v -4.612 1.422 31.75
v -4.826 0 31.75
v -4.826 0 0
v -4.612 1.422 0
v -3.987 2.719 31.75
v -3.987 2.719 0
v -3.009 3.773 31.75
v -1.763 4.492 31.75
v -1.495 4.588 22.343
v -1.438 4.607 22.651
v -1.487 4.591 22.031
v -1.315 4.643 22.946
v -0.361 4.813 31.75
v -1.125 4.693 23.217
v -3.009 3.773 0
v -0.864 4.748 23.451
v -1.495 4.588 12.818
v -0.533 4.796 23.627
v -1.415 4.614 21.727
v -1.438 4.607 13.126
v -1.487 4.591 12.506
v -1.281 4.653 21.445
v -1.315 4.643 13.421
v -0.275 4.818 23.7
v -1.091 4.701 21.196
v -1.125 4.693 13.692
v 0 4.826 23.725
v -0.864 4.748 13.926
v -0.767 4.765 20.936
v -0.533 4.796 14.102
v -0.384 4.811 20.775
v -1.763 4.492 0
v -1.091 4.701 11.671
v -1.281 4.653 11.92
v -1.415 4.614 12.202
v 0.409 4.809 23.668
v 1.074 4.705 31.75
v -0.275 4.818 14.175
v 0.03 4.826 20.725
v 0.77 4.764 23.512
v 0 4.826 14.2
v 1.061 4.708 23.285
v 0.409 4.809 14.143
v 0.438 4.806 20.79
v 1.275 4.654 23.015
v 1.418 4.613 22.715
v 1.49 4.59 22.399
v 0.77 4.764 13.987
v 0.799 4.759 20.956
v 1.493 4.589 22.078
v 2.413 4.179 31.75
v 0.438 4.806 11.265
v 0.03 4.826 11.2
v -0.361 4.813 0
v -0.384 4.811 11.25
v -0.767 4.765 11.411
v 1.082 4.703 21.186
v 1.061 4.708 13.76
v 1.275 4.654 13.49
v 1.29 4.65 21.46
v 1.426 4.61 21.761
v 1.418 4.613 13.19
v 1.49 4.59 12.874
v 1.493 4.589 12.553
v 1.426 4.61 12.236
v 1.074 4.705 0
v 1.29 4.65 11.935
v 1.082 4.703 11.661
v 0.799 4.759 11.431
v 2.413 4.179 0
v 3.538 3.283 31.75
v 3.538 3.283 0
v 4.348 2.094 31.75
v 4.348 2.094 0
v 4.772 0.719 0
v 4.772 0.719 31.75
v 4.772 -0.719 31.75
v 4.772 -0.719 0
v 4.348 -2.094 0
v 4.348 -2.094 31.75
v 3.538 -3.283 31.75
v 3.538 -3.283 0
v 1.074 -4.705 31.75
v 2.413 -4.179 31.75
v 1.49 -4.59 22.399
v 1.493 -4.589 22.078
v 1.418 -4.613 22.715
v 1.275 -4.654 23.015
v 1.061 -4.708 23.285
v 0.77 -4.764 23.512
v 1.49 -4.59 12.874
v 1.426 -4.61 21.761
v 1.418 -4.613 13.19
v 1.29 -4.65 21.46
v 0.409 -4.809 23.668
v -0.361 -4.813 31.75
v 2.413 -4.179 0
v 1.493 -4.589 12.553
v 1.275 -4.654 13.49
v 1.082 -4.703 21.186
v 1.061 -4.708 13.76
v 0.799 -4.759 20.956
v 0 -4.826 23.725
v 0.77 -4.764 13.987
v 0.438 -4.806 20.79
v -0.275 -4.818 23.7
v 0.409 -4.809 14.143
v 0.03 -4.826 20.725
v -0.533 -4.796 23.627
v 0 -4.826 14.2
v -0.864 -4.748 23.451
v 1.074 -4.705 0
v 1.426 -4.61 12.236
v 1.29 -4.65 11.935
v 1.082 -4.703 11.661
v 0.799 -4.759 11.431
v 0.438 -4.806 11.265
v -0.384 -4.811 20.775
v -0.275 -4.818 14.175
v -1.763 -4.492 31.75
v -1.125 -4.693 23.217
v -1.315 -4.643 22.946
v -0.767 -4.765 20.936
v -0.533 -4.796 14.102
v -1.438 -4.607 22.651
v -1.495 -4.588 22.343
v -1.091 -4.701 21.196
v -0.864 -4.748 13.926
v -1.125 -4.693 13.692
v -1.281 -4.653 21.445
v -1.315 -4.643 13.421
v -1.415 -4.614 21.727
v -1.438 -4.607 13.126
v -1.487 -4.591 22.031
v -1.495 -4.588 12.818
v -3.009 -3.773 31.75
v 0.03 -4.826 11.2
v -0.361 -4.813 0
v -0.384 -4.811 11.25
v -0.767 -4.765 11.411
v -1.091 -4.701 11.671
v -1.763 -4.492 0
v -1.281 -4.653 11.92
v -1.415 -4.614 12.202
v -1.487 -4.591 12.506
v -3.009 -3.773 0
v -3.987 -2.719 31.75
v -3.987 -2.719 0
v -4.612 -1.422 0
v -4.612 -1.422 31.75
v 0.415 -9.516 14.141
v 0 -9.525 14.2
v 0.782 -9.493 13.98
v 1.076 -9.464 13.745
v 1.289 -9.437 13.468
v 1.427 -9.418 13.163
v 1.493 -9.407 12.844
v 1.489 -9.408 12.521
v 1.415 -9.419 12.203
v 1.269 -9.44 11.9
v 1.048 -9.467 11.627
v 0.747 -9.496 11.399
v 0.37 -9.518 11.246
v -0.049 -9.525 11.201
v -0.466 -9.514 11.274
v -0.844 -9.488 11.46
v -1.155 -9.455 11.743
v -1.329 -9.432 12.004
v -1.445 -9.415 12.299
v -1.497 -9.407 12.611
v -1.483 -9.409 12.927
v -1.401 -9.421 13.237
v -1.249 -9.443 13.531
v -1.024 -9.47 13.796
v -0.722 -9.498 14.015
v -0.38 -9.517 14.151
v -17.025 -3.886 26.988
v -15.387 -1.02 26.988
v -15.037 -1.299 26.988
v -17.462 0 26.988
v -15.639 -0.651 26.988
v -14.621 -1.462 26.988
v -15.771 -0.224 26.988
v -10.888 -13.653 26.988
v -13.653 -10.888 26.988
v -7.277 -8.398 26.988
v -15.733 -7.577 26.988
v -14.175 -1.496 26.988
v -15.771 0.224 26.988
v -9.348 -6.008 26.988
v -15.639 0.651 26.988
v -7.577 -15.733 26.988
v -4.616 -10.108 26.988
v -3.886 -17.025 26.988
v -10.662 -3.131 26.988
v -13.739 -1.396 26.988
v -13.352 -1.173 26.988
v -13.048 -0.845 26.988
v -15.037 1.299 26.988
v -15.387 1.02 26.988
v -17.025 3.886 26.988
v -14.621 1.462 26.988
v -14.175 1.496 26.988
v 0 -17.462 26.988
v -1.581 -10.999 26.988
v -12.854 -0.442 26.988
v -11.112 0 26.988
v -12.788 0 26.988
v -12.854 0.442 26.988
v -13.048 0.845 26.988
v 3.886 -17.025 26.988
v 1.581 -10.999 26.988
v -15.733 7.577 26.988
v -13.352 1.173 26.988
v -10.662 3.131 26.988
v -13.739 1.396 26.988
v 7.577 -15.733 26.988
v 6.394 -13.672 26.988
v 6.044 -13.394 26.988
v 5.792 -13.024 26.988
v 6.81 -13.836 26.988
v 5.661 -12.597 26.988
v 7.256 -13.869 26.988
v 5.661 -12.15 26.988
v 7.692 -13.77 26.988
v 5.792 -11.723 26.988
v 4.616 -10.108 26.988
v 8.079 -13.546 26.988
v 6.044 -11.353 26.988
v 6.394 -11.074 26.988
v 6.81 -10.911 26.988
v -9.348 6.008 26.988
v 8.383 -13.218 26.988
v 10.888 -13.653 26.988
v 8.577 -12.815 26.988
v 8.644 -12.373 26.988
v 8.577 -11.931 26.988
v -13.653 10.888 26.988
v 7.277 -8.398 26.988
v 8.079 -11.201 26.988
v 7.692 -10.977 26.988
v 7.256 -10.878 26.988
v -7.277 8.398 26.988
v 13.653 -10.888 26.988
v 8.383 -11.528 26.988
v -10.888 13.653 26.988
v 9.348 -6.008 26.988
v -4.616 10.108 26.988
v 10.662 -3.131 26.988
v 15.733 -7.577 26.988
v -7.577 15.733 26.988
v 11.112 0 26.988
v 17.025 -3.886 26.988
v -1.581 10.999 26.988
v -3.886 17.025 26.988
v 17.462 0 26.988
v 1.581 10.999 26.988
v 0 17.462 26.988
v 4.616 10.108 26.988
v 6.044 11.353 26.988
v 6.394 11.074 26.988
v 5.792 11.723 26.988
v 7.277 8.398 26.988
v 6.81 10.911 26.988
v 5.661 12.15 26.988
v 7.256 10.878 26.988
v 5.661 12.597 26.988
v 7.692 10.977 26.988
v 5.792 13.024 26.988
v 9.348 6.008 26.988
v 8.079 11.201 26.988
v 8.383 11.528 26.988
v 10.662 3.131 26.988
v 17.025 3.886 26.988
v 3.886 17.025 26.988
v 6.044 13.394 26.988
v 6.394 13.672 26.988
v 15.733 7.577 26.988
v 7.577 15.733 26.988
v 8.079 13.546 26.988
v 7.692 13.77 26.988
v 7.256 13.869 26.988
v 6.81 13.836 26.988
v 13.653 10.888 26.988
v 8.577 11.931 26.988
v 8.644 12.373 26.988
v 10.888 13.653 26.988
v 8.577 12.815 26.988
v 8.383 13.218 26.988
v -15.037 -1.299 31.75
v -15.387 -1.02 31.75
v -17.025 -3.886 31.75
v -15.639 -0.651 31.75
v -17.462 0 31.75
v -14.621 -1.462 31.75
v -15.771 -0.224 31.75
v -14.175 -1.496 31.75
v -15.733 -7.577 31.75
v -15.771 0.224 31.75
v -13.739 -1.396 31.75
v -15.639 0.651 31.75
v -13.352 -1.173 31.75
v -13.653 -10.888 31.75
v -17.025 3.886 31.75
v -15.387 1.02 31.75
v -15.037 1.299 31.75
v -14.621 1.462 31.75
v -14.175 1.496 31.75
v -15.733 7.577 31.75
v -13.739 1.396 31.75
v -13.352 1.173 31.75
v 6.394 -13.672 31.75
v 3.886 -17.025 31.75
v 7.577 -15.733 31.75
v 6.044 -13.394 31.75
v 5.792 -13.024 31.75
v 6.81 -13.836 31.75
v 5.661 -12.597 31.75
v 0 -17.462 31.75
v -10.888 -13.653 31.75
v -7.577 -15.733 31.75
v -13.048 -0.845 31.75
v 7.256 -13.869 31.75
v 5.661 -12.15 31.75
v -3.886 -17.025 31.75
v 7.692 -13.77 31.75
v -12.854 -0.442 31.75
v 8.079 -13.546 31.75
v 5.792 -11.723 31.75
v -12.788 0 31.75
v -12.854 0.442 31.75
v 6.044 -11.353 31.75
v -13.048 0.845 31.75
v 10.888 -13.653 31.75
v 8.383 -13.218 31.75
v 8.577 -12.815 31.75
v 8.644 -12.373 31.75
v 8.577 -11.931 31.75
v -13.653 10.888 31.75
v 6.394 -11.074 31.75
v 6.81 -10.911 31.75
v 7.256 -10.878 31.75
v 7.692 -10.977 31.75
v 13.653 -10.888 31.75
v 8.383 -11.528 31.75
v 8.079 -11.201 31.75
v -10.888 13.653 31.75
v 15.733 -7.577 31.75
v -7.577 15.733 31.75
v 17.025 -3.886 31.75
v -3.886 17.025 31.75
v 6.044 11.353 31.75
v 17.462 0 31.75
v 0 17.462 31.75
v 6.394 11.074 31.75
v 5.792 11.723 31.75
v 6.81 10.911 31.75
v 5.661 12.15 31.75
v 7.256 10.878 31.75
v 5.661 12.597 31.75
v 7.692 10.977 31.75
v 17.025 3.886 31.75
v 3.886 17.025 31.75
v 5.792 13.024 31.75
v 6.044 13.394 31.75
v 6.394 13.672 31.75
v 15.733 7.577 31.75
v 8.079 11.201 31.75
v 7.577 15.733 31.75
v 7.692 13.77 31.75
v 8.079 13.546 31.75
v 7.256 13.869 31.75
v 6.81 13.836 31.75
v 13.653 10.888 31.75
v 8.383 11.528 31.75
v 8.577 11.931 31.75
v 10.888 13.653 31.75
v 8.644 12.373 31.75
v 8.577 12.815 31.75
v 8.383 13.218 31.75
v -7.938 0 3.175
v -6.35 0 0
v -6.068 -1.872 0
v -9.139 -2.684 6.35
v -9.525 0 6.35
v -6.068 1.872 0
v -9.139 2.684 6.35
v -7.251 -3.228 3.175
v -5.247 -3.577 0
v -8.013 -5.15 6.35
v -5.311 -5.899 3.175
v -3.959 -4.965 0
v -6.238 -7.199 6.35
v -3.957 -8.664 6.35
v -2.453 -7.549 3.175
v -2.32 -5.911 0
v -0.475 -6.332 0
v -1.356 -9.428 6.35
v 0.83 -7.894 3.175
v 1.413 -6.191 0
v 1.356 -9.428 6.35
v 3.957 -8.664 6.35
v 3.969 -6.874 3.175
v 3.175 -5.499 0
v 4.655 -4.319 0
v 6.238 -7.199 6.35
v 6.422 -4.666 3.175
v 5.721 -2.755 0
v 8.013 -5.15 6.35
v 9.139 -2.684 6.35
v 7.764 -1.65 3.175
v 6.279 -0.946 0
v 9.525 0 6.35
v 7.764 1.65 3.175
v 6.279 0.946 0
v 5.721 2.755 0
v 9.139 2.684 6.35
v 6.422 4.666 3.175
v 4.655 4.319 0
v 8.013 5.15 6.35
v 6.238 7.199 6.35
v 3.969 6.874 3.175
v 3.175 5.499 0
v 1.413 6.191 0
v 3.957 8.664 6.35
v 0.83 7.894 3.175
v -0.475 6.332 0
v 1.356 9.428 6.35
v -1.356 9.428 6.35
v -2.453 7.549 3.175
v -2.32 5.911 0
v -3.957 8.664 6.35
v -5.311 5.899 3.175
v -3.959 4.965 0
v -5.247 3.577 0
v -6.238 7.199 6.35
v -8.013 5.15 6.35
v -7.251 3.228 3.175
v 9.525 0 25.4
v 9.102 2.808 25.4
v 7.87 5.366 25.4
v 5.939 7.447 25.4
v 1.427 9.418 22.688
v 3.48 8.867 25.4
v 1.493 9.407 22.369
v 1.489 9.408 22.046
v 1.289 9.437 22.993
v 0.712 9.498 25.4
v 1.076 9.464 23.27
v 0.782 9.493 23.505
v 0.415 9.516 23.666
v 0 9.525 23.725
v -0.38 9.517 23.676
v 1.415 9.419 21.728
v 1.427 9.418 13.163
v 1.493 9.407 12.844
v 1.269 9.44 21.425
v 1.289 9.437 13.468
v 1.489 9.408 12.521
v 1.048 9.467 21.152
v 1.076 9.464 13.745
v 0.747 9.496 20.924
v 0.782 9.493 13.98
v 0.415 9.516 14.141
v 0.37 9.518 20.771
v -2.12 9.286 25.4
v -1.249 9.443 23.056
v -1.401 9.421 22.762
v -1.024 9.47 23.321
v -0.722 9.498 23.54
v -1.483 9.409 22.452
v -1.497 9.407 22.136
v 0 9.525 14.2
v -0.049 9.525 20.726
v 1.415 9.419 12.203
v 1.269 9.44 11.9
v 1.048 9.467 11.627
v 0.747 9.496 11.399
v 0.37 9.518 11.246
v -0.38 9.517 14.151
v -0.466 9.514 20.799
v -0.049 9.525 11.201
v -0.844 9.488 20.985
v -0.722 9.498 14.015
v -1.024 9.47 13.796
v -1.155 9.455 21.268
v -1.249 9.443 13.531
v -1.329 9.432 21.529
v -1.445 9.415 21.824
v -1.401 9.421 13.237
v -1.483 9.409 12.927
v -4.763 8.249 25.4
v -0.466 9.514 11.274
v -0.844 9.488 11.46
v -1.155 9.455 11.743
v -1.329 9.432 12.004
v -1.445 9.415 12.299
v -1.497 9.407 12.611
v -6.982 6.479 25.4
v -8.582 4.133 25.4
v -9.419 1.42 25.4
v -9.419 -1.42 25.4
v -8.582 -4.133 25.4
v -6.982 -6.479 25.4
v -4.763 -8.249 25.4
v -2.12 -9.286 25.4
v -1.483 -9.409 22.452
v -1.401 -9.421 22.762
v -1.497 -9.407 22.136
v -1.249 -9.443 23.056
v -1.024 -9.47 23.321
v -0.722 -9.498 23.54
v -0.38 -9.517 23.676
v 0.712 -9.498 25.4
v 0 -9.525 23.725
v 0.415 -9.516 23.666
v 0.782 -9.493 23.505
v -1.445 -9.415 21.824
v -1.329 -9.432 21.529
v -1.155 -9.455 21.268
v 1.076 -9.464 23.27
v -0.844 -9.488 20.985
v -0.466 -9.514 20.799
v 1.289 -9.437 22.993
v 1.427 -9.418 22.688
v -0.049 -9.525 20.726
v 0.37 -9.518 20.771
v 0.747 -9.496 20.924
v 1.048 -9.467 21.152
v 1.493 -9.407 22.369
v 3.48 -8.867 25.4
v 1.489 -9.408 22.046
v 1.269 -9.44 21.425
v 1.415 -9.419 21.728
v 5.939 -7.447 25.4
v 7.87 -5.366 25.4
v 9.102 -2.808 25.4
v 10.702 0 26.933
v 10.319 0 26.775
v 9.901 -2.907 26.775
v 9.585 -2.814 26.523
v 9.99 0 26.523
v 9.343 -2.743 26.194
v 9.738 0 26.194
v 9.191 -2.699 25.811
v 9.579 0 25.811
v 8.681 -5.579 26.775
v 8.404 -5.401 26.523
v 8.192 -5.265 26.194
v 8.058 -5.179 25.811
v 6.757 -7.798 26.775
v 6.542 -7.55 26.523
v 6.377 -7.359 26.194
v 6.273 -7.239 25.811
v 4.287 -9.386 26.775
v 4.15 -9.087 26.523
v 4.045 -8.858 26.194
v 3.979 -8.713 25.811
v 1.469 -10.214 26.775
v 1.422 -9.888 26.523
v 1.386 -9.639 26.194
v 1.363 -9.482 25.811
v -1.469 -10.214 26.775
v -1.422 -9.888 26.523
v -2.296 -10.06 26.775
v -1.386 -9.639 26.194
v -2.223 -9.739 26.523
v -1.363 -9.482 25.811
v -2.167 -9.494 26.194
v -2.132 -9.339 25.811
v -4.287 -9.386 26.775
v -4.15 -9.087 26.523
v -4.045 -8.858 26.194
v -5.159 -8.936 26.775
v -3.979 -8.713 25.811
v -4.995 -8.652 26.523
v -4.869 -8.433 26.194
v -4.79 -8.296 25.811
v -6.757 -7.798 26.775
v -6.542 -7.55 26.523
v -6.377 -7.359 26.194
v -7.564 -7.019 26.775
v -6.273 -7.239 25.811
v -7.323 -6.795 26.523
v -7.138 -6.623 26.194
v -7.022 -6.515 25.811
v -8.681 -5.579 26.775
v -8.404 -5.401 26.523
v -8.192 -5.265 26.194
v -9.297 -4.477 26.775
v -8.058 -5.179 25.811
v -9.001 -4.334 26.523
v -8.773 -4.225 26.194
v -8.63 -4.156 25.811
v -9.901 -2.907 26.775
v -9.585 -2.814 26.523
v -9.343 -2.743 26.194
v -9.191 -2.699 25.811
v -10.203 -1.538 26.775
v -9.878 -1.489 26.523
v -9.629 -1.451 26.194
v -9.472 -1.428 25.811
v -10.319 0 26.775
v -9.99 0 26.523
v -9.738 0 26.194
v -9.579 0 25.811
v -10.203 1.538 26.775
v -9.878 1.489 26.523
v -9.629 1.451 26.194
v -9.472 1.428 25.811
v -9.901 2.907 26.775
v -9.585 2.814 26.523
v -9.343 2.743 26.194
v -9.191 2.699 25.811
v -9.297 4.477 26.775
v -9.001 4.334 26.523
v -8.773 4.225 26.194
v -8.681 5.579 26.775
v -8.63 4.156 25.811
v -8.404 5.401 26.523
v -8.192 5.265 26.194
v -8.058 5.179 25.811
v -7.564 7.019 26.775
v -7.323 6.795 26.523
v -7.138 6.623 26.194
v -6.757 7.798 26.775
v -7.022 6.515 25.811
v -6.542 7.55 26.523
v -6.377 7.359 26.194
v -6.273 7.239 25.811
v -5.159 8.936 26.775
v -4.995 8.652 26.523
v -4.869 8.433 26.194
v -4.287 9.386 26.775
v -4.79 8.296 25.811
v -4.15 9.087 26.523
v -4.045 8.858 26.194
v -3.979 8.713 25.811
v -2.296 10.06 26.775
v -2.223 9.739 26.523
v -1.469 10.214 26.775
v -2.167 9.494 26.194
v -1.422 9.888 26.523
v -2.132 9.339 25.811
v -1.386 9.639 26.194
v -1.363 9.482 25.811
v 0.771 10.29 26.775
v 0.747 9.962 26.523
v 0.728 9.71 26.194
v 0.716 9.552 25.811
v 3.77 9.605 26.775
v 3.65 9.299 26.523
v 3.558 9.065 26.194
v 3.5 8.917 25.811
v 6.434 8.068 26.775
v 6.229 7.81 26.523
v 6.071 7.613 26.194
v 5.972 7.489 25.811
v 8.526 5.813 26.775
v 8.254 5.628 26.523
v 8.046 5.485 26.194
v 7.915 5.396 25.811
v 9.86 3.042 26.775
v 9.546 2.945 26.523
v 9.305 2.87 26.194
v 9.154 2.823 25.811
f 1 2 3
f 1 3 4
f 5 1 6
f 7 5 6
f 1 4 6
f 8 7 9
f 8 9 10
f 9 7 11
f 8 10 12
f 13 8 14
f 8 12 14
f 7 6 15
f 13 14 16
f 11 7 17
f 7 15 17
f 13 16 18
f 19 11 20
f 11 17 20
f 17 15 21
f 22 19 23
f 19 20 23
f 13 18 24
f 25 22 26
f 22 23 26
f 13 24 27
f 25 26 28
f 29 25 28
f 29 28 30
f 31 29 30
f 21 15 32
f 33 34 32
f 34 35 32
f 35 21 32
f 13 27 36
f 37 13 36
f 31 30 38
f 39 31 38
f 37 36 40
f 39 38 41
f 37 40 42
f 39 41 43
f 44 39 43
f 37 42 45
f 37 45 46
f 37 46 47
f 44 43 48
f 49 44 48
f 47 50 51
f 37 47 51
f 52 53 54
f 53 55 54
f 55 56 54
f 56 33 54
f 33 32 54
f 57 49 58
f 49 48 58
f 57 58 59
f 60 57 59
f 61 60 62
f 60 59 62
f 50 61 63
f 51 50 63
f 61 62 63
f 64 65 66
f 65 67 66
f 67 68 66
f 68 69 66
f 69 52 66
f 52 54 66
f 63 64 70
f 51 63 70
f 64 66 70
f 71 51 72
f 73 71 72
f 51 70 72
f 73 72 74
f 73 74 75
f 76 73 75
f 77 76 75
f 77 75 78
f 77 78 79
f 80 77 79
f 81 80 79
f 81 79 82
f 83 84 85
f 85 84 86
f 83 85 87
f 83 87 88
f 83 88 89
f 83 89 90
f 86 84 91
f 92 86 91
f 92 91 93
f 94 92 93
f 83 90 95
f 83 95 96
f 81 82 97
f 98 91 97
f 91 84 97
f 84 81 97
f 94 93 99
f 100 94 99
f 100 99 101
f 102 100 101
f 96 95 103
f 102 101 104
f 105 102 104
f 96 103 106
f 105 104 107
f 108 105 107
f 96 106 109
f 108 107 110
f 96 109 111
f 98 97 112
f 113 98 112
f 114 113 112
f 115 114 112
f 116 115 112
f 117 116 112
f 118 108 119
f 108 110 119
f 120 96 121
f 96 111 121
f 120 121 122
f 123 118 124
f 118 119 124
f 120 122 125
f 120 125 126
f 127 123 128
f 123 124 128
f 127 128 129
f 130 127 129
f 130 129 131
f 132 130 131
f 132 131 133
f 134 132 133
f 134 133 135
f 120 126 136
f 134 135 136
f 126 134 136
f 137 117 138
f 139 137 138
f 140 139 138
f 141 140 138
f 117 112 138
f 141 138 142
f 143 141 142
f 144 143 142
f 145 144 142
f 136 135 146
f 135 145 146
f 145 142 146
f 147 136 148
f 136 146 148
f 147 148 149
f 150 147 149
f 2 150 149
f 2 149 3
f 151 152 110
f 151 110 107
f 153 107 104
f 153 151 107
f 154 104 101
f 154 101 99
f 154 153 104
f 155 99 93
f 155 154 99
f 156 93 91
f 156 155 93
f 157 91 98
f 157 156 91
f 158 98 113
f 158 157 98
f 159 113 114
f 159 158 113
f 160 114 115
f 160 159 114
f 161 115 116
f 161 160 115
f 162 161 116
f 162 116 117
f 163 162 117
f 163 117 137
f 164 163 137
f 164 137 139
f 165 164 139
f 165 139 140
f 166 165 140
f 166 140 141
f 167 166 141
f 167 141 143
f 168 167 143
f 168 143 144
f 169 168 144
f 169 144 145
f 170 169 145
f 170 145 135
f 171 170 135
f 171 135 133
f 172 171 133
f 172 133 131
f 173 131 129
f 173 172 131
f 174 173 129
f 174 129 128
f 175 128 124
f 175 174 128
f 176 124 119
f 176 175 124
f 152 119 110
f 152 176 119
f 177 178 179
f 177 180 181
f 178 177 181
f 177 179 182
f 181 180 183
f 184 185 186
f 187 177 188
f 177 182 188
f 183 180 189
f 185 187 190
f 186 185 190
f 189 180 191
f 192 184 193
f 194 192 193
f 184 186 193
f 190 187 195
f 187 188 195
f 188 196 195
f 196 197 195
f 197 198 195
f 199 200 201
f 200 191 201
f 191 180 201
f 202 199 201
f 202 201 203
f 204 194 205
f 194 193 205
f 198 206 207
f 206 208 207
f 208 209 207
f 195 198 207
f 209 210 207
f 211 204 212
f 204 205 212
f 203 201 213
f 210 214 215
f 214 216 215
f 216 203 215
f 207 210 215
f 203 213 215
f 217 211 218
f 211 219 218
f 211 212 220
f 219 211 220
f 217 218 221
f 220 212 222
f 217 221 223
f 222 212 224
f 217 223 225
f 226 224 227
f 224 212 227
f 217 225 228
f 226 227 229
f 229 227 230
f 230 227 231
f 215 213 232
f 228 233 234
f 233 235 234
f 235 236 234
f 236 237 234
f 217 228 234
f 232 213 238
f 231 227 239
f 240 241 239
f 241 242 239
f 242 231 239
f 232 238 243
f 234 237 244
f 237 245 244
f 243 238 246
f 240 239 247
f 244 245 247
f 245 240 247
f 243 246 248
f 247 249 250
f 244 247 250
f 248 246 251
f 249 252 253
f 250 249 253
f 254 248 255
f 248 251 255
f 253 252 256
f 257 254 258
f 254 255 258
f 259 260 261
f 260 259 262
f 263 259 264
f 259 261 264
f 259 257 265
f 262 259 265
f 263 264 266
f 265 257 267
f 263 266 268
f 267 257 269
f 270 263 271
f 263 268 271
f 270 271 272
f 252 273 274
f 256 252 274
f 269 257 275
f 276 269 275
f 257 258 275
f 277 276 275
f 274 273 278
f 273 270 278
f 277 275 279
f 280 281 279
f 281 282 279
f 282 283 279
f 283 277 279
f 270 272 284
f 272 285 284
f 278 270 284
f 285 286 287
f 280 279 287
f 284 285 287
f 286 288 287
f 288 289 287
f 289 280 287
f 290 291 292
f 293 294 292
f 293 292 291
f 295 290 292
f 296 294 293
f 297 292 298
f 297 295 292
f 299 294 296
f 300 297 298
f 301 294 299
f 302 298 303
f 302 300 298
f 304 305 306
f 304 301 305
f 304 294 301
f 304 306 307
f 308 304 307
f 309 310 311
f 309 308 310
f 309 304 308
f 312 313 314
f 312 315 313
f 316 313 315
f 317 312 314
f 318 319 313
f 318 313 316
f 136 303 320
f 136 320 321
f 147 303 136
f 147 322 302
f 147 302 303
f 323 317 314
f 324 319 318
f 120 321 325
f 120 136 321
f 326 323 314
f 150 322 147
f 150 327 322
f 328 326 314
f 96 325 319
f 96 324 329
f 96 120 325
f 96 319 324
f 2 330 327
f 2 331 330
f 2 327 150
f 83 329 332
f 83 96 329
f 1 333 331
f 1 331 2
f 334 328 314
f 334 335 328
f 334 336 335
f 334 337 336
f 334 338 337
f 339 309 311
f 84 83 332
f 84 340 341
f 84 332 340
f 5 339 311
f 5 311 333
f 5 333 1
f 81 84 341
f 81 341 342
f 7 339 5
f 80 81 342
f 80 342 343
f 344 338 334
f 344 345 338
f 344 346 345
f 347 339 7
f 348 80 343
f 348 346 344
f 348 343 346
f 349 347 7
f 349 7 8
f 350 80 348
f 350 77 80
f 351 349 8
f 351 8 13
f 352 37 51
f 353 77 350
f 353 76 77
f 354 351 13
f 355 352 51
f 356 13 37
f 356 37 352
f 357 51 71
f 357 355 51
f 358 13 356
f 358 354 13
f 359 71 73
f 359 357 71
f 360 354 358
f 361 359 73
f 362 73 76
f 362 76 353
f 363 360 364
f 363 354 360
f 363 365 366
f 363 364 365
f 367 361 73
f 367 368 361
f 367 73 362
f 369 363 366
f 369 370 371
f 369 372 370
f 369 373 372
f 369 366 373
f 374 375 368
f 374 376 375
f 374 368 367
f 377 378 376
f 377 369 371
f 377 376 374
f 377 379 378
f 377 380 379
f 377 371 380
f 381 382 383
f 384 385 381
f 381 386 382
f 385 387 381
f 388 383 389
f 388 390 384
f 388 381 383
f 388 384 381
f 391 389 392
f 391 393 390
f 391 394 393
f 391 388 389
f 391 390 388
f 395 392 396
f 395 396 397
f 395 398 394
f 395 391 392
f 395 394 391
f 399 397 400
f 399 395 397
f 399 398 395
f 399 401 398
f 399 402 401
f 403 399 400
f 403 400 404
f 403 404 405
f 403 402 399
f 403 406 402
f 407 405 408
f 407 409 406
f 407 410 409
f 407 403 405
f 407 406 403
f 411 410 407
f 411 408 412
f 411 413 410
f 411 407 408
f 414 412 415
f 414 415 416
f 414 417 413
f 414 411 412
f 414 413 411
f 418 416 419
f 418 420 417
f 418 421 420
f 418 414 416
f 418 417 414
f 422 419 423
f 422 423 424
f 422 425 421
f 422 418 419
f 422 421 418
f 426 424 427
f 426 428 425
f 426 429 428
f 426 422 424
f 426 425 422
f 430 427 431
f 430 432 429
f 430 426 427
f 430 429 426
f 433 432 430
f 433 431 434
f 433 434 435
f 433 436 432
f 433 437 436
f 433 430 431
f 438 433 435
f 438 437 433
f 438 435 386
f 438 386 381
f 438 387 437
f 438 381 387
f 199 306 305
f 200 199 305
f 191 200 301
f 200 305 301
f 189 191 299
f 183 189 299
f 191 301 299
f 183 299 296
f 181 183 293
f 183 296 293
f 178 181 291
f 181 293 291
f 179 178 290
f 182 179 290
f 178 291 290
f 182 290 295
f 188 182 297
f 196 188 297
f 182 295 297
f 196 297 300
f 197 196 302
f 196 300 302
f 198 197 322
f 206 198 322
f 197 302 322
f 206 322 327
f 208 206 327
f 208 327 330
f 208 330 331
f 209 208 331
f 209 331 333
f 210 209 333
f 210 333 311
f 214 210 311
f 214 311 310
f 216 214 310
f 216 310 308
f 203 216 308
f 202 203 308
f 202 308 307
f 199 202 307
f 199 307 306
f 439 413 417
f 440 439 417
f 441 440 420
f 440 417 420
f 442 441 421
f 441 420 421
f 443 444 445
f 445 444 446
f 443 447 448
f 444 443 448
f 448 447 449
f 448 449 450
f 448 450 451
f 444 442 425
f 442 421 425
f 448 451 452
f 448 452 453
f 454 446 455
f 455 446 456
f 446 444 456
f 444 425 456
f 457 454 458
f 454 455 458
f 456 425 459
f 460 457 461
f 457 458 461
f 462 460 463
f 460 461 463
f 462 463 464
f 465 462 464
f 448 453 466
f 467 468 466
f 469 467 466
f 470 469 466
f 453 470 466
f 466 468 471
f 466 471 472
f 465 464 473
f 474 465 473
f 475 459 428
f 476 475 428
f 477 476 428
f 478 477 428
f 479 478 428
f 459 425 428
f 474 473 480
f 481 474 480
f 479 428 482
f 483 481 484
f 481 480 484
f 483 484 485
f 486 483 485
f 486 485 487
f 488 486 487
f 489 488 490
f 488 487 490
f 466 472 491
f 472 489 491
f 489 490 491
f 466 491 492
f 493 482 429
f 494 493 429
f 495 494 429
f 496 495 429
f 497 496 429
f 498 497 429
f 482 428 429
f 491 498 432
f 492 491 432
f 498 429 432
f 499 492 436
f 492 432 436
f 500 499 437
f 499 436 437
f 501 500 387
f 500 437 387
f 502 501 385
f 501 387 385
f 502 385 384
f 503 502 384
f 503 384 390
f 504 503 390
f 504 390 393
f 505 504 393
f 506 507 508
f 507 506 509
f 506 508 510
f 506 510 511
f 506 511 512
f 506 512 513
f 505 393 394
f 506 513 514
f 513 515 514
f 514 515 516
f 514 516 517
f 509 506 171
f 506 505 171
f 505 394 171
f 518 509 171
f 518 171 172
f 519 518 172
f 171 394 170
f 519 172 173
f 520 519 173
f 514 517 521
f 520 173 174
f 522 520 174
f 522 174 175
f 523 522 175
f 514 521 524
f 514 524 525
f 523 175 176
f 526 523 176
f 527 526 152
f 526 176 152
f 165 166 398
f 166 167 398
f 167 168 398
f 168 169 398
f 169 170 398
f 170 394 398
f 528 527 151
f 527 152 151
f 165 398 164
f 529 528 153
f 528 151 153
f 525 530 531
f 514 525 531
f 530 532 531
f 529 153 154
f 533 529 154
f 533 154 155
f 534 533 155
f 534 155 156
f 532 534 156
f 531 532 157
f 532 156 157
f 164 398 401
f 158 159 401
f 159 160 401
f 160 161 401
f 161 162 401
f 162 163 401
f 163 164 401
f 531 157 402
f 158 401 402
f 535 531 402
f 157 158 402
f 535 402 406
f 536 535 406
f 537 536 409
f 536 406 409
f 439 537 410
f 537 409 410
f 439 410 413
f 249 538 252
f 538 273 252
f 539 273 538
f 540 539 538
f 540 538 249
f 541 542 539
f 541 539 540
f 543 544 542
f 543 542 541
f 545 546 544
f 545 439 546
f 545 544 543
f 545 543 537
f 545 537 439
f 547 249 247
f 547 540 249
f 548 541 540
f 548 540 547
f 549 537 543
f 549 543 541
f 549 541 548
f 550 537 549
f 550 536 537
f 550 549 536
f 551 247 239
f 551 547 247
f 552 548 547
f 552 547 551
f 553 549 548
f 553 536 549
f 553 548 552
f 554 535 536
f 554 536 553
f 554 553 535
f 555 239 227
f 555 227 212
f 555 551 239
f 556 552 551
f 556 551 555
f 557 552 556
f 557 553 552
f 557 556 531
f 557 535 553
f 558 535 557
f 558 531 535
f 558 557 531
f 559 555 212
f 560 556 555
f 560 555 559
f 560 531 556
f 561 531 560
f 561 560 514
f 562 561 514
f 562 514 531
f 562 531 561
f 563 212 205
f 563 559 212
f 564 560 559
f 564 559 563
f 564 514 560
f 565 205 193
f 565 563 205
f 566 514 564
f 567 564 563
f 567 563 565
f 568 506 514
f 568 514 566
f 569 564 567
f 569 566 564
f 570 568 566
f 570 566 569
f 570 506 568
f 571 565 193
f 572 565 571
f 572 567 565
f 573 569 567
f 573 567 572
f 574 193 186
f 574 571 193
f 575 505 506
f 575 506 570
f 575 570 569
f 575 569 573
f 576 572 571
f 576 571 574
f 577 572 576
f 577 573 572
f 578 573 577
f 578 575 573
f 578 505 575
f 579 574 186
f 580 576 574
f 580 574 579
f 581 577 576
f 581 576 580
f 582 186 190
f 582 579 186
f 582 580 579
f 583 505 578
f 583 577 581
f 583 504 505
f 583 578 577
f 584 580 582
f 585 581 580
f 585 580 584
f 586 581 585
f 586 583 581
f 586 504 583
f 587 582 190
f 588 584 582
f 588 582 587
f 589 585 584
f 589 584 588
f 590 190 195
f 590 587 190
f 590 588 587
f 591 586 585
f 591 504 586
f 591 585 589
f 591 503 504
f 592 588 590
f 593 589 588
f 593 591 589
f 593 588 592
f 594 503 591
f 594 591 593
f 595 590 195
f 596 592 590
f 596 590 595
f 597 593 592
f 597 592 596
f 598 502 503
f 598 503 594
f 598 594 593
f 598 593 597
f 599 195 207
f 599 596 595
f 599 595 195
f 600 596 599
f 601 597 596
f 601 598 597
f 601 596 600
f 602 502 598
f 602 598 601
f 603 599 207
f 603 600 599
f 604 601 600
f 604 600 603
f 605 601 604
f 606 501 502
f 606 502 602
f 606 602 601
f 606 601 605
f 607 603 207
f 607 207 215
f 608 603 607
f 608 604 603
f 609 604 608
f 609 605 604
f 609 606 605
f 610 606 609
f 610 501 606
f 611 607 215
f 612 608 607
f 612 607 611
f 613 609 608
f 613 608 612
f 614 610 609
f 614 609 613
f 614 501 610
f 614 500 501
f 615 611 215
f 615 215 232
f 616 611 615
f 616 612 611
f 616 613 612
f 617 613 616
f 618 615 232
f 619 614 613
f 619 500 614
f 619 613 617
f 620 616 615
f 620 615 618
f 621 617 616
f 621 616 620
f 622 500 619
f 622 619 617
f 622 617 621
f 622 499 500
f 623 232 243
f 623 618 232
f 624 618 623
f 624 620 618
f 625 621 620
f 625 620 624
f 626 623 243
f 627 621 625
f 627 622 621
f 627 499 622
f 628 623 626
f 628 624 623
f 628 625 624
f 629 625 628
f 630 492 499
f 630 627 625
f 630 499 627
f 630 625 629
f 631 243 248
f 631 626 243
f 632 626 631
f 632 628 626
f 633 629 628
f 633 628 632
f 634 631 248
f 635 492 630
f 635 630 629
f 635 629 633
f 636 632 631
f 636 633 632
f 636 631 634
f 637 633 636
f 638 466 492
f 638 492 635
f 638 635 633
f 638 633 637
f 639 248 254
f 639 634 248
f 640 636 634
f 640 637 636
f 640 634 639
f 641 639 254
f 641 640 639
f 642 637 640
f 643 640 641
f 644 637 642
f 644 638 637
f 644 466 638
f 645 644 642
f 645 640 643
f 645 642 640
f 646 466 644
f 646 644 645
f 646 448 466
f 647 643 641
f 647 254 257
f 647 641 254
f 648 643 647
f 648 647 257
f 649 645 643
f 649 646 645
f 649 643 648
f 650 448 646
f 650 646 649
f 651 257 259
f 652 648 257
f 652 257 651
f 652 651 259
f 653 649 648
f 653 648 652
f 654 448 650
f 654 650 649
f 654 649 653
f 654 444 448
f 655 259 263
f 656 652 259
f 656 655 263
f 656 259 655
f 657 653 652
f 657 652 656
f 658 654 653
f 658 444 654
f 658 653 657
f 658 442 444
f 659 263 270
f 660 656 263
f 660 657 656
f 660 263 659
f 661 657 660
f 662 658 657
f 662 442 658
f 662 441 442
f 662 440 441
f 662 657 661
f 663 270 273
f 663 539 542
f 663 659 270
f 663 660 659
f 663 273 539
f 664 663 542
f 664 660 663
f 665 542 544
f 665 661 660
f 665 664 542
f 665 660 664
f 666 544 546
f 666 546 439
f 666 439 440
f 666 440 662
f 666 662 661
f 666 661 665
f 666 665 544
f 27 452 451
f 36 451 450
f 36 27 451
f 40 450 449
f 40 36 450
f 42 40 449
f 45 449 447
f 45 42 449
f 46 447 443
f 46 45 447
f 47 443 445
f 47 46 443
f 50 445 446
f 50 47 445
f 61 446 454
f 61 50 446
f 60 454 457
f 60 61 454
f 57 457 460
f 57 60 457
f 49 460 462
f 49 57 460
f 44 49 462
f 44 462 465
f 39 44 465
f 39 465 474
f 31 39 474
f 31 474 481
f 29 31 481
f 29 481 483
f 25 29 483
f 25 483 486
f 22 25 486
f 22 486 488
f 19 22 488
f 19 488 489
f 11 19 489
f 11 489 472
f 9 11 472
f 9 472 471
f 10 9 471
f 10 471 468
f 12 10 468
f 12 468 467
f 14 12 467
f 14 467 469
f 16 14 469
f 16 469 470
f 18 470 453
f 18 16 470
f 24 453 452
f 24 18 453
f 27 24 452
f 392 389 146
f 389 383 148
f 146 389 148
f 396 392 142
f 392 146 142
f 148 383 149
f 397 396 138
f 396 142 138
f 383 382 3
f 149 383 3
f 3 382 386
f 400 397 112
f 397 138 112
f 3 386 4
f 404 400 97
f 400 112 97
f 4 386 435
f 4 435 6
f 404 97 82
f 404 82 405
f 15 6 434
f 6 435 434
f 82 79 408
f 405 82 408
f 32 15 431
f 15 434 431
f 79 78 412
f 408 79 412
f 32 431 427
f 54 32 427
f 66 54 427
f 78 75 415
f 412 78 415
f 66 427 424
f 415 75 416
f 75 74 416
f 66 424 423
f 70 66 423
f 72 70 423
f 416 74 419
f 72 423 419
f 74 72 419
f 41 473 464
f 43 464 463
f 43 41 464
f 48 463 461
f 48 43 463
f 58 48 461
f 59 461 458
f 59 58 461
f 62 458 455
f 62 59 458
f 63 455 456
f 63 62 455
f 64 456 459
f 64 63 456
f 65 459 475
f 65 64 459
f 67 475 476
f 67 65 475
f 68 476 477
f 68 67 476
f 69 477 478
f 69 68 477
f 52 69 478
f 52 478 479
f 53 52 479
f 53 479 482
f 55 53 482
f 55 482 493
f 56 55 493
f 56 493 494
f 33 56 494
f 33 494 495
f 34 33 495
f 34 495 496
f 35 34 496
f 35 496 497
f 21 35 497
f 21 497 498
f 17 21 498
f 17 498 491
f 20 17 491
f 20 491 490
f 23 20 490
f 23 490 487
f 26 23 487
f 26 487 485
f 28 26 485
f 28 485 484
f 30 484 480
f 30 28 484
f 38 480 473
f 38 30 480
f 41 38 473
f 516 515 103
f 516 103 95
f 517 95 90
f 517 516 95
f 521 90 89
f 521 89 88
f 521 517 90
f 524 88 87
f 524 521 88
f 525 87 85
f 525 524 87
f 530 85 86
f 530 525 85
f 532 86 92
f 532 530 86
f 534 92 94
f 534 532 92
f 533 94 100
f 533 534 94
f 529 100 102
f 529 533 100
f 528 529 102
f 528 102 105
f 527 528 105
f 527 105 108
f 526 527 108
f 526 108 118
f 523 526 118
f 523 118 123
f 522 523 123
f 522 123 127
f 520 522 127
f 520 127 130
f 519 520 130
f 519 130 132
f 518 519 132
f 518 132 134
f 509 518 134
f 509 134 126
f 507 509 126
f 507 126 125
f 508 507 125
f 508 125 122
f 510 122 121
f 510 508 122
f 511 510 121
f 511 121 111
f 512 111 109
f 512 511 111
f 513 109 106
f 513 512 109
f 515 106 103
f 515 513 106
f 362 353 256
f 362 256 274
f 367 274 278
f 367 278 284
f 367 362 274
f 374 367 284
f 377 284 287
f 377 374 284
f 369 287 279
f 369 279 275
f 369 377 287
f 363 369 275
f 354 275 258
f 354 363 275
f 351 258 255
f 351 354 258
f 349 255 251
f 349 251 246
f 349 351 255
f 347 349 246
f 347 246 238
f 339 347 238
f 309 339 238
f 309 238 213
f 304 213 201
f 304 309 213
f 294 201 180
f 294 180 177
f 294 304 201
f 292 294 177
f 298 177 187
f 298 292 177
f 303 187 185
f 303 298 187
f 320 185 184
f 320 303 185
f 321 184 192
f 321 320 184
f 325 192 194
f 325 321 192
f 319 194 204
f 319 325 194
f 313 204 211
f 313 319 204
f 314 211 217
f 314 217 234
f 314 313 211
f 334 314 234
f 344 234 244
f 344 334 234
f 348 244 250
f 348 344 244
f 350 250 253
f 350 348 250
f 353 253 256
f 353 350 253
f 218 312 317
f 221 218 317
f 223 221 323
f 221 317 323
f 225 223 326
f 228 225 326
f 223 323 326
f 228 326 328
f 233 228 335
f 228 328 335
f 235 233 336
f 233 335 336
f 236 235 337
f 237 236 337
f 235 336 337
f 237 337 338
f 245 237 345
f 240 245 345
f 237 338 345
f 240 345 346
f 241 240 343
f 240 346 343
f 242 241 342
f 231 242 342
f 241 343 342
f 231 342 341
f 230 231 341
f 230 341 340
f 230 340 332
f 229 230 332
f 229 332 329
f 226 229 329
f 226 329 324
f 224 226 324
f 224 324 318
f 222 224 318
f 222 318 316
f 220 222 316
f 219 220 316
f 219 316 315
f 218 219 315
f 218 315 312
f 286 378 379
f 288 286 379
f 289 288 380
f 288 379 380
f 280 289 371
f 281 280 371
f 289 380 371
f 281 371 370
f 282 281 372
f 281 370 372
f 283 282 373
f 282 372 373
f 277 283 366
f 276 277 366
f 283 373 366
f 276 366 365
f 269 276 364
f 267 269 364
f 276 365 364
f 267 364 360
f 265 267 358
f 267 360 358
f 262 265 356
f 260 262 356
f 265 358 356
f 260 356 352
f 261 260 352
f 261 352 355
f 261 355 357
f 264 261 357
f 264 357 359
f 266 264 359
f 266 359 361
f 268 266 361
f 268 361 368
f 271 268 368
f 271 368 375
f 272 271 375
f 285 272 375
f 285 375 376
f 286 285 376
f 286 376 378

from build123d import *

# Parameters (mm, degrees)
SKETCH1_R               = 9.525
BOSS_EXTRUDE1_DEPTH     = 31.75
SKETCH18_R              = 17.4625
BOSS_EXTRUDE2_DEPTH     = 4.7625
SKETCH12_R              = 4.826
CUT_EXTRUDE3_DEPTH      = 31.75
CUT_EXTRUDE4_DEPTH      = 41.223628783
CUT_EXTRUDE4_DEPTH_BACK = 41.223628783
SKETCH14_R              = 1.5
SKETCH17_R              = 1.499997
CUT_EXTRUDE5_DEPTH      = 6.35
CIRPATTERN1_COUNT       = 3
FILLET1_R               = 1.5875


with BuildPart() as part:
    # Sketch1 → Boss-Extrude1 (new body)
    with BuildSketch(Plane.XY):
        Circle(SKETCH1_R)
    extrude(amount=BOSS_EXTRUDE1_DEPTH)

    # Sketch18 → Boss-Extrude2 (add)
    with BuildSketch(Plane.XY.offset(31.75)):
        Circle(SKETCH18_R)
    extrude(amount=-BOSS_EXTRUDE2_DEPTH)

    # Sketch12 → Cut-Extrude3 (cut)
    with BuildSketch(Plane(origin=(0, 0, 0), x_dir=(-1, 0, 0), z_dir=(0, 0, -1))):
        Circle(SKETCH12_R)
    extrude(amount=-CUT_EXTRUDE3_DEPTH, mode=Mode.SUBTRACT)

    # Sketch14 → Cut-Extrude4 (cut, two sides: drawn at the far end of the back side and taken through both)
    with BuildSketch(Plane(origin=(0, 0, 0), x_dir=(1, 0, 0), z_dir=(0, 1, 0)).offset(-CUT_EXTRUDE4_DEPTH_BACK)):
        with Locations(Location((0, -12.7, 0), (0, 0, 270))):
            Circle(SKETCH14_R)
        with Locations(Location((0, -22.225, 0), (0, 0, 270))):
            Circle(SKETCH14_R)
    extrude(amount=CUT_EXTRUDE4_DEPTH + CUT_EXTRUDE4_DEPTH_BACK, mode=Mode.SUBTRACT)

    # Sketch17 → Cut-Extrude5 (cut)
    with BuildSketch(Plane.XY.offset(31.75)):
        with Locations((7.14375, 12.373337957)):
            Circle(SKETCH17_R)
    cut_extrude5 = extrude(amount=-CUT_EXTRUDE5_DEPTH, mode=Mode.SUBTRACT)

    # CirPattern1: Cut-Extrude5 ×3 about axis
    cirpattern1_axis = Axis((0, 0, 0), (0, 0, 1))
    for i in range(1, CIRPATTERN1_COUNT):
        add(cut_extrude5.rotate(cirpattern1_axis, i * 360 / CIRPATTERN1_COUNT), mode=Mode.SUBTRACT)

    # Sketch16 → Cut-Revolve1 (revolve, cut)
    with BuildSketch(Plane(origin=(0, 0, 0), x_dir=(1, 0, 0), z_dir=(0, 1, 0))):
        Polygon((-6.35, 0), (-9.525, -6.35), (-9.525, 0), align=None)
    revolve(axis=Axis((0, 0, 0), (0, 0, 1)), mode=Mode.SUBTRACT)

    # Fillet1
    fillet1_edges = [part.edges().sort_by_distance(p)[0] for p in [
        (-9.525, 0, 26.9875),
    ]]
    fillet(fillet1_edges, radius=FILLET1_R)


solid = part.part
